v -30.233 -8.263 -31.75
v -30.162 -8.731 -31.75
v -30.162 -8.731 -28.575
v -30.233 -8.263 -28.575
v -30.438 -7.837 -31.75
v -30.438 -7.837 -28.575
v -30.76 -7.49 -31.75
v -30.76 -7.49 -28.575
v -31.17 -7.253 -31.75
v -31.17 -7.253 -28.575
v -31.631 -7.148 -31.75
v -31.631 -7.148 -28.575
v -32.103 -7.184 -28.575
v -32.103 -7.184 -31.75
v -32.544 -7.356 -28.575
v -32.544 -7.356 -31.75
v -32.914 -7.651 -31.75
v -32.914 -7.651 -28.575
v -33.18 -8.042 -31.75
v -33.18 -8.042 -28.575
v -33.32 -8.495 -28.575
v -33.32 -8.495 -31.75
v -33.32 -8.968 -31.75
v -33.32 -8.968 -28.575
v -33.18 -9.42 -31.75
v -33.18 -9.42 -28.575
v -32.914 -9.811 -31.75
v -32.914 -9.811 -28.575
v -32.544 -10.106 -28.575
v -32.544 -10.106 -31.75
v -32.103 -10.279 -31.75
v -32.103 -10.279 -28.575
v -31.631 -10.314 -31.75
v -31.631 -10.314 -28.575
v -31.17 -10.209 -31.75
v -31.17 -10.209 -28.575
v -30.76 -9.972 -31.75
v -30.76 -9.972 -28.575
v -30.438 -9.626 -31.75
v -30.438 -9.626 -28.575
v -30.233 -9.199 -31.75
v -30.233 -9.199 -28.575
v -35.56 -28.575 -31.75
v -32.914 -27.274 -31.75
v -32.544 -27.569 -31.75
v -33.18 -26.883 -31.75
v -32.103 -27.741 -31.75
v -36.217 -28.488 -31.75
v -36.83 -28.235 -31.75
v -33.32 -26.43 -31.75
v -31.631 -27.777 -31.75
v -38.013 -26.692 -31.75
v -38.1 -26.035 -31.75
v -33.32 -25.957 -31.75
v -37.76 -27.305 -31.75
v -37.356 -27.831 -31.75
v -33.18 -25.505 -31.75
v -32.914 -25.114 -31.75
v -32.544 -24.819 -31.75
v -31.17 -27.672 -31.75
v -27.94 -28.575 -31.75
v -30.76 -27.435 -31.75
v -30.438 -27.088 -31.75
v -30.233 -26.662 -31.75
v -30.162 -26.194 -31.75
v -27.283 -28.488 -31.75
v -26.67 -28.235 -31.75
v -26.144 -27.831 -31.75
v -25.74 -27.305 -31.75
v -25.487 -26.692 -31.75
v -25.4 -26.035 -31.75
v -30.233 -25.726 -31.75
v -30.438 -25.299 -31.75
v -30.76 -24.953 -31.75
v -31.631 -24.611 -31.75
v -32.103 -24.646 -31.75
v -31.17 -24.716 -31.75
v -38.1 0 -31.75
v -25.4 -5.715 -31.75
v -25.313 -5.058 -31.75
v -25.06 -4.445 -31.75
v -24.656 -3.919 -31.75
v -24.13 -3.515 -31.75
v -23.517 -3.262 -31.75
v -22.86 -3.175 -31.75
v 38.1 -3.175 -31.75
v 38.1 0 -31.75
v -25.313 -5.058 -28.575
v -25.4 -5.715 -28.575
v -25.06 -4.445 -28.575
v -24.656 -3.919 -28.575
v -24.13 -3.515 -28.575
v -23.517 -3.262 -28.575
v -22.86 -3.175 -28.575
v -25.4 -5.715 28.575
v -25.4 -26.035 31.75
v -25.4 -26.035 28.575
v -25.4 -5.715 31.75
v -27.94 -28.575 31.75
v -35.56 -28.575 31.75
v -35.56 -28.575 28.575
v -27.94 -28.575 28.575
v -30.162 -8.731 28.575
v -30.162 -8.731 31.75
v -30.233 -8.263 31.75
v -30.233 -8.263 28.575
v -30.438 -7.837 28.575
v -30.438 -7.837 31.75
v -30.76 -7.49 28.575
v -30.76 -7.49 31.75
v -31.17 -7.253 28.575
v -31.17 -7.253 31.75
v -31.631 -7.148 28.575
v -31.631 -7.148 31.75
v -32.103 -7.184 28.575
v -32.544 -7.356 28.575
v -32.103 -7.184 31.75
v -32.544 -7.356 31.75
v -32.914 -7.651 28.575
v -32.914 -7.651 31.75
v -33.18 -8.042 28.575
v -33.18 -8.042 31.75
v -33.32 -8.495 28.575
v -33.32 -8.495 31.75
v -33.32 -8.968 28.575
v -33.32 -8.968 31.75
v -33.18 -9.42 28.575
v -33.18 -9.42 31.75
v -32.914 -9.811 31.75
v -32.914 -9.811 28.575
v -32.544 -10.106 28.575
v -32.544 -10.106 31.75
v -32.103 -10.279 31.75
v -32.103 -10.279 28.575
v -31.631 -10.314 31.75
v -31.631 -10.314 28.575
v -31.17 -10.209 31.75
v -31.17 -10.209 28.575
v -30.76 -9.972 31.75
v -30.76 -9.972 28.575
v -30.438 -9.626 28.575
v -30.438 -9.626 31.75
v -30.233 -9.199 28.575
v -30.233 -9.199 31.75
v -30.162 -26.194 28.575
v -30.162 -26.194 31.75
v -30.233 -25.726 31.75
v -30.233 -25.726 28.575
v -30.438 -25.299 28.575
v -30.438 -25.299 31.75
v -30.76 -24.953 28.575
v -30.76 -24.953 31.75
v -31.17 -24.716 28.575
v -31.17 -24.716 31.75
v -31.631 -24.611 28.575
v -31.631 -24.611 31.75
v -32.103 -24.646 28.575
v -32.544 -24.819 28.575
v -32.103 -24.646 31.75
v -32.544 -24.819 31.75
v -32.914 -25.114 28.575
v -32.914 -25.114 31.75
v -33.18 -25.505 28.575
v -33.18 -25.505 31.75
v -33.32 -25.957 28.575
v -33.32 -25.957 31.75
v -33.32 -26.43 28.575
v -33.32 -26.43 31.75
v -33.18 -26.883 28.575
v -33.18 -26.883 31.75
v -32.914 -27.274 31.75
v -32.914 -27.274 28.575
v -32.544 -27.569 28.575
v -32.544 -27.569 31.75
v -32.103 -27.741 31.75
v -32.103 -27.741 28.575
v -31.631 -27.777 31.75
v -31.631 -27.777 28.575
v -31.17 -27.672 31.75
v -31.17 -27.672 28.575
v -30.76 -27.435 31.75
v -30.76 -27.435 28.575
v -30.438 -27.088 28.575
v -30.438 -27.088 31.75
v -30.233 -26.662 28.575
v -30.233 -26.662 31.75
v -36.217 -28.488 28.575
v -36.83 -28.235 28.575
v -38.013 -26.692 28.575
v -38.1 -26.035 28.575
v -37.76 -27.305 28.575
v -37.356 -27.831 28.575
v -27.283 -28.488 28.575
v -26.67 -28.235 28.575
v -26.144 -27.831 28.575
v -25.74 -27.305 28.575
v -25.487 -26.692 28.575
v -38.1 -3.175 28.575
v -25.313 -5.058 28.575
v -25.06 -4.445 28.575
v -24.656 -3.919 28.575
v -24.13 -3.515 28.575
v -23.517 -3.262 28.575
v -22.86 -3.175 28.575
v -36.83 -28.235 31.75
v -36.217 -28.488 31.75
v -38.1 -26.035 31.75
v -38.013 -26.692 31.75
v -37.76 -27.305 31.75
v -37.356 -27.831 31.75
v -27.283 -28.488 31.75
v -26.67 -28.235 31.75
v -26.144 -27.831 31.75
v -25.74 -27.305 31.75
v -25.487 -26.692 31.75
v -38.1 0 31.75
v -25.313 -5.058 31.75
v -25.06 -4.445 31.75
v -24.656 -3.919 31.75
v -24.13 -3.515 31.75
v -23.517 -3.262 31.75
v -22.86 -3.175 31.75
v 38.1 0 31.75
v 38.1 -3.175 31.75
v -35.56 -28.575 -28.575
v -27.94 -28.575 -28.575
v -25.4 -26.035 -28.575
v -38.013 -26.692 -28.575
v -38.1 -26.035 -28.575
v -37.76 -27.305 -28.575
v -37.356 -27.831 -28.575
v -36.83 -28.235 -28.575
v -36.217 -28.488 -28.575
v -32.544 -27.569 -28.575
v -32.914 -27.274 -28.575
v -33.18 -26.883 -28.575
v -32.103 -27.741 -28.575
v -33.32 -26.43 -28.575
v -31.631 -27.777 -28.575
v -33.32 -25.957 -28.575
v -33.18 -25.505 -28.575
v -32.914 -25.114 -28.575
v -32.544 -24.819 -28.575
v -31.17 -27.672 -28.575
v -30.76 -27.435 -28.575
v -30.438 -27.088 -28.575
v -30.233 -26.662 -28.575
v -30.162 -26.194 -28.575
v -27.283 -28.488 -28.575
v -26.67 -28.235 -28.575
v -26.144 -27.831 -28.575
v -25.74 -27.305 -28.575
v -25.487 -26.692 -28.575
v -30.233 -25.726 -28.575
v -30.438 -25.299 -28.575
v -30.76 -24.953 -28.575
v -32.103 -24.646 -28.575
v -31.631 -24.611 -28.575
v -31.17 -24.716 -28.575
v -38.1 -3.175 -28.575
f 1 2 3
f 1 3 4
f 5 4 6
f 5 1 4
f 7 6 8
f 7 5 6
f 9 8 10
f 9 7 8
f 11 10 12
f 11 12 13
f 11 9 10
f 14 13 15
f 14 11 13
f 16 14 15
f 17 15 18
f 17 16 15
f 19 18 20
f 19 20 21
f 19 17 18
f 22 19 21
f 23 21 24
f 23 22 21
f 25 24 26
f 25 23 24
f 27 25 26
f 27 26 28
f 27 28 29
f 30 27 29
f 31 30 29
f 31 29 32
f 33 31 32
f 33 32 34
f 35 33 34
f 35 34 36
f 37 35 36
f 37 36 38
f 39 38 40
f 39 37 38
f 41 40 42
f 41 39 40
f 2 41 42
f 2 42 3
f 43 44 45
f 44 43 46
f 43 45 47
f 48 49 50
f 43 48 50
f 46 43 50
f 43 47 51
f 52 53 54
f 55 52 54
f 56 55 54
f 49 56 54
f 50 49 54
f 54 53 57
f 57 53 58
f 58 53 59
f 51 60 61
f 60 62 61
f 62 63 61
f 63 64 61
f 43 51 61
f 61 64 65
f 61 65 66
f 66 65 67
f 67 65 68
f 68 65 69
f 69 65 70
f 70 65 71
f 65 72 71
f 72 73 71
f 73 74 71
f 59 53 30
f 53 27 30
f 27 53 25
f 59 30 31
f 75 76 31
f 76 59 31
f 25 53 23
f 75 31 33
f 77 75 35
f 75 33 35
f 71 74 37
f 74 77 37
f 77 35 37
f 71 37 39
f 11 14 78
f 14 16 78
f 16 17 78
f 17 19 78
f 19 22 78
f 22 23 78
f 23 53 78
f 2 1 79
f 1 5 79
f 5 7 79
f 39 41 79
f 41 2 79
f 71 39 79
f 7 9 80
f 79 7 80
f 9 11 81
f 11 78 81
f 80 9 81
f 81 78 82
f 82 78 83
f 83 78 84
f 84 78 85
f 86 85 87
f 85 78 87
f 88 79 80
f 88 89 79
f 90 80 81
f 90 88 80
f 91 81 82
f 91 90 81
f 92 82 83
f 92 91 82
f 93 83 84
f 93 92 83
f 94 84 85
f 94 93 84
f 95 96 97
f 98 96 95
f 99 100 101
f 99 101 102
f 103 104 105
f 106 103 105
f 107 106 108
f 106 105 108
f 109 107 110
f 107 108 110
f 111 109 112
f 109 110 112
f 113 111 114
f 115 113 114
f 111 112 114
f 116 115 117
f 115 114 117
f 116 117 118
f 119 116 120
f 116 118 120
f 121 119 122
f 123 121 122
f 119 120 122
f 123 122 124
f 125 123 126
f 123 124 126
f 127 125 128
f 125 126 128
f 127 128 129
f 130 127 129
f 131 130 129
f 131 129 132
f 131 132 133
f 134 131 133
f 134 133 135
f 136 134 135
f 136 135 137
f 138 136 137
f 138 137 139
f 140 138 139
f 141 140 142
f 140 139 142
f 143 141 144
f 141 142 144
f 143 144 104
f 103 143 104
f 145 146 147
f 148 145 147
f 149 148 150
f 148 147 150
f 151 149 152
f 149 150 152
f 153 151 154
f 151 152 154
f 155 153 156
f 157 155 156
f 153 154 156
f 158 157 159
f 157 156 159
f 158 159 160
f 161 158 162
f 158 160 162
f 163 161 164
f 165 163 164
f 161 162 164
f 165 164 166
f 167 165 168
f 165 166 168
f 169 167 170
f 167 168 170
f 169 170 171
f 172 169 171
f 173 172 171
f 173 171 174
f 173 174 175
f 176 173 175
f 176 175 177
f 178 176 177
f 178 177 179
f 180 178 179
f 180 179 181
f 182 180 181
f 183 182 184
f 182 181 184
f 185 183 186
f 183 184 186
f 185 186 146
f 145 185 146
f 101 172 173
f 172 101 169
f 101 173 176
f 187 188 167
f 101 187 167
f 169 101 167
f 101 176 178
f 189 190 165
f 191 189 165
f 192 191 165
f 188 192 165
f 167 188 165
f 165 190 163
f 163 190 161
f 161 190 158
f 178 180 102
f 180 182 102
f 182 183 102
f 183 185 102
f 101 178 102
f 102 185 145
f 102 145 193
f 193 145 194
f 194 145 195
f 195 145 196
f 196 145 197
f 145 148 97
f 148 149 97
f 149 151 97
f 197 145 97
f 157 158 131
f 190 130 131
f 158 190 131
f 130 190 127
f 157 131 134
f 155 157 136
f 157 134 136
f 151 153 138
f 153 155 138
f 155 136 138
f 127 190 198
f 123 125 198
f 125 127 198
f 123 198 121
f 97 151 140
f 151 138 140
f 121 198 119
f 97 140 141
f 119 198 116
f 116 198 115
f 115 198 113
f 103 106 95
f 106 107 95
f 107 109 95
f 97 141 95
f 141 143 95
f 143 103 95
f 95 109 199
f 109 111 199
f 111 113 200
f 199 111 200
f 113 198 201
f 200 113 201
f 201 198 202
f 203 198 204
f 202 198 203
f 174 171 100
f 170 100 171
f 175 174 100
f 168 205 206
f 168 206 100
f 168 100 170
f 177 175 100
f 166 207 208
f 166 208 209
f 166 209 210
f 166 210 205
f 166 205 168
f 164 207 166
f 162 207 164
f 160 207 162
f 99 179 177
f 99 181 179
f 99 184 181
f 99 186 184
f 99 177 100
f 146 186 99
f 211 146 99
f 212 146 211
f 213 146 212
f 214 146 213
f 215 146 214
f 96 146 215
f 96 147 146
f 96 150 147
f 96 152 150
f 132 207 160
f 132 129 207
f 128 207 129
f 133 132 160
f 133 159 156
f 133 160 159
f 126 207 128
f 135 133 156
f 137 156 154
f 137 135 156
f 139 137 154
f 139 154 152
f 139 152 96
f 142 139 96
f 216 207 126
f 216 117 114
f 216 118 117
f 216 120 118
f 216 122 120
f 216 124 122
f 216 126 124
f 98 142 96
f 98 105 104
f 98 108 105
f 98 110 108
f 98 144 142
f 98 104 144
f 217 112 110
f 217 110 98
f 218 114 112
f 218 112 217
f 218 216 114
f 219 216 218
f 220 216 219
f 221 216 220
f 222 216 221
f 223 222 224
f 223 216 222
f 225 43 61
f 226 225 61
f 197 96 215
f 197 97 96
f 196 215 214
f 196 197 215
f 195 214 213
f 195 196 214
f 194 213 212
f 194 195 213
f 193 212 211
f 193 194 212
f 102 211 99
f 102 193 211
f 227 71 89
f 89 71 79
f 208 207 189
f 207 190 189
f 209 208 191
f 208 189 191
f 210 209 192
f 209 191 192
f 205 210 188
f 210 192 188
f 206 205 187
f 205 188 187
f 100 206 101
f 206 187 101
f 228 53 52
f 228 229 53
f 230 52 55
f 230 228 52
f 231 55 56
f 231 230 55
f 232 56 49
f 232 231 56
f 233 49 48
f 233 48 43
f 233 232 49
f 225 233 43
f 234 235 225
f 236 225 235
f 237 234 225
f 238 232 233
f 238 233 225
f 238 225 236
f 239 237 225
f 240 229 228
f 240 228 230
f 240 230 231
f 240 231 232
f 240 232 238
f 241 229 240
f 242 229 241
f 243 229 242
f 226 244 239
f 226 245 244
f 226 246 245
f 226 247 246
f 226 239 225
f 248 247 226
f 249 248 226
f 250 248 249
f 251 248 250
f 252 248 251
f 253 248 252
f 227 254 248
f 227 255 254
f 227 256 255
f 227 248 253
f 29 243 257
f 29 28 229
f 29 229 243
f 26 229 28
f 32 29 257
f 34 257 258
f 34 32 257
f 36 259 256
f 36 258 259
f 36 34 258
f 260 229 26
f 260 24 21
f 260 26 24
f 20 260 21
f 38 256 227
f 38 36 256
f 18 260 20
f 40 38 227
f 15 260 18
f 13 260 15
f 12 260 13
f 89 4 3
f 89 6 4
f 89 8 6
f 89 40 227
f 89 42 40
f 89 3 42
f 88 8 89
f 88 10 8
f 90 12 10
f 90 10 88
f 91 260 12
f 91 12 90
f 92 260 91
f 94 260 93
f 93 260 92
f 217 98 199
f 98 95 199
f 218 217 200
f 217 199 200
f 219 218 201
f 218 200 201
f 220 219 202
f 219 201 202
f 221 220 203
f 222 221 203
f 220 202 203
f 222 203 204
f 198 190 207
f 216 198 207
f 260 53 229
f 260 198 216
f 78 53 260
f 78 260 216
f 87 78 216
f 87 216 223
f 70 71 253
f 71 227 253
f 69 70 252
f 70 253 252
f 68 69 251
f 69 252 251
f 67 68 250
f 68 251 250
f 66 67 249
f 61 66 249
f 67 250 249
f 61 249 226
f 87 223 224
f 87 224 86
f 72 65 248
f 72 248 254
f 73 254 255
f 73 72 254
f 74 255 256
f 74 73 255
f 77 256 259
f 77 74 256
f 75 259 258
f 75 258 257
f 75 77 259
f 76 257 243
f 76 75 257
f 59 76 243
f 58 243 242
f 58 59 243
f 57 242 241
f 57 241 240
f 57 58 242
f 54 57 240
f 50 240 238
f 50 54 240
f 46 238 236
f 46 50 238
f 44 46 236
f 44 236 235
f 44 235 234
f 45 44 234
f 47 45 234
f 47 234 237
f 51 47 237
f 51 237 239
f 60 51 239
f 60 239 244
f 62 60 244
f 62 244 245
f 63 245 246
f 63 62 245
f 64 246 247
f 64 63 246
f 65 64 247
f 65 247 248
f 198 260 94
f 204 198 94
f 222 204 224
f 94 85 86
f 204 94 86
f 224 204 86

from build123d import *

# Parameters (mm, degrees)
SKETCH1_W           = 76.2
SKETCH1_H           = 63.5
BOSS_EXTRUDE1_DEPTH = 3.175
SKETCH3_W           = 12.7
SKETCH3_H           = 25.4
SKETCH3_R           = 1.5875
BOSS_EXTRUDE2_DEPTH = 3.175
FILLET1_R           = 2.54


with BuildPart() as part:
    # Sketch1 → Boss-Extrude1 (new body)
    with BuildSketch(Plane(origin=(0, 0, 0), x_dir=(1, 0, 0), z_dir=(0, 1, 0))):
        Rectangle(SKETCH1_W, SKETCH1_H)
    extrude(amount=-BOSS_EXTRUDE1_DEPTH)

    # Sketch3 → Boss-Extrude2 (add)
    with BuildSketch(Plane.XY.offset(31.75)):
        with Locations((-31.75, -15.875)):
            Rectangle(SKETCH3_W, SKETCH3_H)
        with Locations((-31.75, -26.19375)):
            Circle(SKETCH3_R, mode=Mode.SUBTRACT)
        with Locations((-31.75, -8.73125)):
            Circle(SKETCH3_R, mode=Mode.SUBTRACT)
    boss_extrude2 = extrude(amount=-BOSS_EXTRUDE2_DEPTH)

    # Mirror1: Boss-Extrude2 across plane
    add(boss_extrude2.mirror(Plane.XY))

    # Fillet1
    fillet1_edges = [part.edges().sort_by_distance(p)[0] for p in [
        (-38.1, -28.575, 30.1625),
        (-25.4, -3.175, 30.1625),
        (-25.4, -28.575, 30.1625),
        (-38.1, -28.575, -30.1625),
        (-25.4, -28.575, -30.1625),
        (-25.4, -3.175, -30.1625),
    ]]
    fillet(fillet1_edges, radius=FILLET1_R)


solid = part.part
